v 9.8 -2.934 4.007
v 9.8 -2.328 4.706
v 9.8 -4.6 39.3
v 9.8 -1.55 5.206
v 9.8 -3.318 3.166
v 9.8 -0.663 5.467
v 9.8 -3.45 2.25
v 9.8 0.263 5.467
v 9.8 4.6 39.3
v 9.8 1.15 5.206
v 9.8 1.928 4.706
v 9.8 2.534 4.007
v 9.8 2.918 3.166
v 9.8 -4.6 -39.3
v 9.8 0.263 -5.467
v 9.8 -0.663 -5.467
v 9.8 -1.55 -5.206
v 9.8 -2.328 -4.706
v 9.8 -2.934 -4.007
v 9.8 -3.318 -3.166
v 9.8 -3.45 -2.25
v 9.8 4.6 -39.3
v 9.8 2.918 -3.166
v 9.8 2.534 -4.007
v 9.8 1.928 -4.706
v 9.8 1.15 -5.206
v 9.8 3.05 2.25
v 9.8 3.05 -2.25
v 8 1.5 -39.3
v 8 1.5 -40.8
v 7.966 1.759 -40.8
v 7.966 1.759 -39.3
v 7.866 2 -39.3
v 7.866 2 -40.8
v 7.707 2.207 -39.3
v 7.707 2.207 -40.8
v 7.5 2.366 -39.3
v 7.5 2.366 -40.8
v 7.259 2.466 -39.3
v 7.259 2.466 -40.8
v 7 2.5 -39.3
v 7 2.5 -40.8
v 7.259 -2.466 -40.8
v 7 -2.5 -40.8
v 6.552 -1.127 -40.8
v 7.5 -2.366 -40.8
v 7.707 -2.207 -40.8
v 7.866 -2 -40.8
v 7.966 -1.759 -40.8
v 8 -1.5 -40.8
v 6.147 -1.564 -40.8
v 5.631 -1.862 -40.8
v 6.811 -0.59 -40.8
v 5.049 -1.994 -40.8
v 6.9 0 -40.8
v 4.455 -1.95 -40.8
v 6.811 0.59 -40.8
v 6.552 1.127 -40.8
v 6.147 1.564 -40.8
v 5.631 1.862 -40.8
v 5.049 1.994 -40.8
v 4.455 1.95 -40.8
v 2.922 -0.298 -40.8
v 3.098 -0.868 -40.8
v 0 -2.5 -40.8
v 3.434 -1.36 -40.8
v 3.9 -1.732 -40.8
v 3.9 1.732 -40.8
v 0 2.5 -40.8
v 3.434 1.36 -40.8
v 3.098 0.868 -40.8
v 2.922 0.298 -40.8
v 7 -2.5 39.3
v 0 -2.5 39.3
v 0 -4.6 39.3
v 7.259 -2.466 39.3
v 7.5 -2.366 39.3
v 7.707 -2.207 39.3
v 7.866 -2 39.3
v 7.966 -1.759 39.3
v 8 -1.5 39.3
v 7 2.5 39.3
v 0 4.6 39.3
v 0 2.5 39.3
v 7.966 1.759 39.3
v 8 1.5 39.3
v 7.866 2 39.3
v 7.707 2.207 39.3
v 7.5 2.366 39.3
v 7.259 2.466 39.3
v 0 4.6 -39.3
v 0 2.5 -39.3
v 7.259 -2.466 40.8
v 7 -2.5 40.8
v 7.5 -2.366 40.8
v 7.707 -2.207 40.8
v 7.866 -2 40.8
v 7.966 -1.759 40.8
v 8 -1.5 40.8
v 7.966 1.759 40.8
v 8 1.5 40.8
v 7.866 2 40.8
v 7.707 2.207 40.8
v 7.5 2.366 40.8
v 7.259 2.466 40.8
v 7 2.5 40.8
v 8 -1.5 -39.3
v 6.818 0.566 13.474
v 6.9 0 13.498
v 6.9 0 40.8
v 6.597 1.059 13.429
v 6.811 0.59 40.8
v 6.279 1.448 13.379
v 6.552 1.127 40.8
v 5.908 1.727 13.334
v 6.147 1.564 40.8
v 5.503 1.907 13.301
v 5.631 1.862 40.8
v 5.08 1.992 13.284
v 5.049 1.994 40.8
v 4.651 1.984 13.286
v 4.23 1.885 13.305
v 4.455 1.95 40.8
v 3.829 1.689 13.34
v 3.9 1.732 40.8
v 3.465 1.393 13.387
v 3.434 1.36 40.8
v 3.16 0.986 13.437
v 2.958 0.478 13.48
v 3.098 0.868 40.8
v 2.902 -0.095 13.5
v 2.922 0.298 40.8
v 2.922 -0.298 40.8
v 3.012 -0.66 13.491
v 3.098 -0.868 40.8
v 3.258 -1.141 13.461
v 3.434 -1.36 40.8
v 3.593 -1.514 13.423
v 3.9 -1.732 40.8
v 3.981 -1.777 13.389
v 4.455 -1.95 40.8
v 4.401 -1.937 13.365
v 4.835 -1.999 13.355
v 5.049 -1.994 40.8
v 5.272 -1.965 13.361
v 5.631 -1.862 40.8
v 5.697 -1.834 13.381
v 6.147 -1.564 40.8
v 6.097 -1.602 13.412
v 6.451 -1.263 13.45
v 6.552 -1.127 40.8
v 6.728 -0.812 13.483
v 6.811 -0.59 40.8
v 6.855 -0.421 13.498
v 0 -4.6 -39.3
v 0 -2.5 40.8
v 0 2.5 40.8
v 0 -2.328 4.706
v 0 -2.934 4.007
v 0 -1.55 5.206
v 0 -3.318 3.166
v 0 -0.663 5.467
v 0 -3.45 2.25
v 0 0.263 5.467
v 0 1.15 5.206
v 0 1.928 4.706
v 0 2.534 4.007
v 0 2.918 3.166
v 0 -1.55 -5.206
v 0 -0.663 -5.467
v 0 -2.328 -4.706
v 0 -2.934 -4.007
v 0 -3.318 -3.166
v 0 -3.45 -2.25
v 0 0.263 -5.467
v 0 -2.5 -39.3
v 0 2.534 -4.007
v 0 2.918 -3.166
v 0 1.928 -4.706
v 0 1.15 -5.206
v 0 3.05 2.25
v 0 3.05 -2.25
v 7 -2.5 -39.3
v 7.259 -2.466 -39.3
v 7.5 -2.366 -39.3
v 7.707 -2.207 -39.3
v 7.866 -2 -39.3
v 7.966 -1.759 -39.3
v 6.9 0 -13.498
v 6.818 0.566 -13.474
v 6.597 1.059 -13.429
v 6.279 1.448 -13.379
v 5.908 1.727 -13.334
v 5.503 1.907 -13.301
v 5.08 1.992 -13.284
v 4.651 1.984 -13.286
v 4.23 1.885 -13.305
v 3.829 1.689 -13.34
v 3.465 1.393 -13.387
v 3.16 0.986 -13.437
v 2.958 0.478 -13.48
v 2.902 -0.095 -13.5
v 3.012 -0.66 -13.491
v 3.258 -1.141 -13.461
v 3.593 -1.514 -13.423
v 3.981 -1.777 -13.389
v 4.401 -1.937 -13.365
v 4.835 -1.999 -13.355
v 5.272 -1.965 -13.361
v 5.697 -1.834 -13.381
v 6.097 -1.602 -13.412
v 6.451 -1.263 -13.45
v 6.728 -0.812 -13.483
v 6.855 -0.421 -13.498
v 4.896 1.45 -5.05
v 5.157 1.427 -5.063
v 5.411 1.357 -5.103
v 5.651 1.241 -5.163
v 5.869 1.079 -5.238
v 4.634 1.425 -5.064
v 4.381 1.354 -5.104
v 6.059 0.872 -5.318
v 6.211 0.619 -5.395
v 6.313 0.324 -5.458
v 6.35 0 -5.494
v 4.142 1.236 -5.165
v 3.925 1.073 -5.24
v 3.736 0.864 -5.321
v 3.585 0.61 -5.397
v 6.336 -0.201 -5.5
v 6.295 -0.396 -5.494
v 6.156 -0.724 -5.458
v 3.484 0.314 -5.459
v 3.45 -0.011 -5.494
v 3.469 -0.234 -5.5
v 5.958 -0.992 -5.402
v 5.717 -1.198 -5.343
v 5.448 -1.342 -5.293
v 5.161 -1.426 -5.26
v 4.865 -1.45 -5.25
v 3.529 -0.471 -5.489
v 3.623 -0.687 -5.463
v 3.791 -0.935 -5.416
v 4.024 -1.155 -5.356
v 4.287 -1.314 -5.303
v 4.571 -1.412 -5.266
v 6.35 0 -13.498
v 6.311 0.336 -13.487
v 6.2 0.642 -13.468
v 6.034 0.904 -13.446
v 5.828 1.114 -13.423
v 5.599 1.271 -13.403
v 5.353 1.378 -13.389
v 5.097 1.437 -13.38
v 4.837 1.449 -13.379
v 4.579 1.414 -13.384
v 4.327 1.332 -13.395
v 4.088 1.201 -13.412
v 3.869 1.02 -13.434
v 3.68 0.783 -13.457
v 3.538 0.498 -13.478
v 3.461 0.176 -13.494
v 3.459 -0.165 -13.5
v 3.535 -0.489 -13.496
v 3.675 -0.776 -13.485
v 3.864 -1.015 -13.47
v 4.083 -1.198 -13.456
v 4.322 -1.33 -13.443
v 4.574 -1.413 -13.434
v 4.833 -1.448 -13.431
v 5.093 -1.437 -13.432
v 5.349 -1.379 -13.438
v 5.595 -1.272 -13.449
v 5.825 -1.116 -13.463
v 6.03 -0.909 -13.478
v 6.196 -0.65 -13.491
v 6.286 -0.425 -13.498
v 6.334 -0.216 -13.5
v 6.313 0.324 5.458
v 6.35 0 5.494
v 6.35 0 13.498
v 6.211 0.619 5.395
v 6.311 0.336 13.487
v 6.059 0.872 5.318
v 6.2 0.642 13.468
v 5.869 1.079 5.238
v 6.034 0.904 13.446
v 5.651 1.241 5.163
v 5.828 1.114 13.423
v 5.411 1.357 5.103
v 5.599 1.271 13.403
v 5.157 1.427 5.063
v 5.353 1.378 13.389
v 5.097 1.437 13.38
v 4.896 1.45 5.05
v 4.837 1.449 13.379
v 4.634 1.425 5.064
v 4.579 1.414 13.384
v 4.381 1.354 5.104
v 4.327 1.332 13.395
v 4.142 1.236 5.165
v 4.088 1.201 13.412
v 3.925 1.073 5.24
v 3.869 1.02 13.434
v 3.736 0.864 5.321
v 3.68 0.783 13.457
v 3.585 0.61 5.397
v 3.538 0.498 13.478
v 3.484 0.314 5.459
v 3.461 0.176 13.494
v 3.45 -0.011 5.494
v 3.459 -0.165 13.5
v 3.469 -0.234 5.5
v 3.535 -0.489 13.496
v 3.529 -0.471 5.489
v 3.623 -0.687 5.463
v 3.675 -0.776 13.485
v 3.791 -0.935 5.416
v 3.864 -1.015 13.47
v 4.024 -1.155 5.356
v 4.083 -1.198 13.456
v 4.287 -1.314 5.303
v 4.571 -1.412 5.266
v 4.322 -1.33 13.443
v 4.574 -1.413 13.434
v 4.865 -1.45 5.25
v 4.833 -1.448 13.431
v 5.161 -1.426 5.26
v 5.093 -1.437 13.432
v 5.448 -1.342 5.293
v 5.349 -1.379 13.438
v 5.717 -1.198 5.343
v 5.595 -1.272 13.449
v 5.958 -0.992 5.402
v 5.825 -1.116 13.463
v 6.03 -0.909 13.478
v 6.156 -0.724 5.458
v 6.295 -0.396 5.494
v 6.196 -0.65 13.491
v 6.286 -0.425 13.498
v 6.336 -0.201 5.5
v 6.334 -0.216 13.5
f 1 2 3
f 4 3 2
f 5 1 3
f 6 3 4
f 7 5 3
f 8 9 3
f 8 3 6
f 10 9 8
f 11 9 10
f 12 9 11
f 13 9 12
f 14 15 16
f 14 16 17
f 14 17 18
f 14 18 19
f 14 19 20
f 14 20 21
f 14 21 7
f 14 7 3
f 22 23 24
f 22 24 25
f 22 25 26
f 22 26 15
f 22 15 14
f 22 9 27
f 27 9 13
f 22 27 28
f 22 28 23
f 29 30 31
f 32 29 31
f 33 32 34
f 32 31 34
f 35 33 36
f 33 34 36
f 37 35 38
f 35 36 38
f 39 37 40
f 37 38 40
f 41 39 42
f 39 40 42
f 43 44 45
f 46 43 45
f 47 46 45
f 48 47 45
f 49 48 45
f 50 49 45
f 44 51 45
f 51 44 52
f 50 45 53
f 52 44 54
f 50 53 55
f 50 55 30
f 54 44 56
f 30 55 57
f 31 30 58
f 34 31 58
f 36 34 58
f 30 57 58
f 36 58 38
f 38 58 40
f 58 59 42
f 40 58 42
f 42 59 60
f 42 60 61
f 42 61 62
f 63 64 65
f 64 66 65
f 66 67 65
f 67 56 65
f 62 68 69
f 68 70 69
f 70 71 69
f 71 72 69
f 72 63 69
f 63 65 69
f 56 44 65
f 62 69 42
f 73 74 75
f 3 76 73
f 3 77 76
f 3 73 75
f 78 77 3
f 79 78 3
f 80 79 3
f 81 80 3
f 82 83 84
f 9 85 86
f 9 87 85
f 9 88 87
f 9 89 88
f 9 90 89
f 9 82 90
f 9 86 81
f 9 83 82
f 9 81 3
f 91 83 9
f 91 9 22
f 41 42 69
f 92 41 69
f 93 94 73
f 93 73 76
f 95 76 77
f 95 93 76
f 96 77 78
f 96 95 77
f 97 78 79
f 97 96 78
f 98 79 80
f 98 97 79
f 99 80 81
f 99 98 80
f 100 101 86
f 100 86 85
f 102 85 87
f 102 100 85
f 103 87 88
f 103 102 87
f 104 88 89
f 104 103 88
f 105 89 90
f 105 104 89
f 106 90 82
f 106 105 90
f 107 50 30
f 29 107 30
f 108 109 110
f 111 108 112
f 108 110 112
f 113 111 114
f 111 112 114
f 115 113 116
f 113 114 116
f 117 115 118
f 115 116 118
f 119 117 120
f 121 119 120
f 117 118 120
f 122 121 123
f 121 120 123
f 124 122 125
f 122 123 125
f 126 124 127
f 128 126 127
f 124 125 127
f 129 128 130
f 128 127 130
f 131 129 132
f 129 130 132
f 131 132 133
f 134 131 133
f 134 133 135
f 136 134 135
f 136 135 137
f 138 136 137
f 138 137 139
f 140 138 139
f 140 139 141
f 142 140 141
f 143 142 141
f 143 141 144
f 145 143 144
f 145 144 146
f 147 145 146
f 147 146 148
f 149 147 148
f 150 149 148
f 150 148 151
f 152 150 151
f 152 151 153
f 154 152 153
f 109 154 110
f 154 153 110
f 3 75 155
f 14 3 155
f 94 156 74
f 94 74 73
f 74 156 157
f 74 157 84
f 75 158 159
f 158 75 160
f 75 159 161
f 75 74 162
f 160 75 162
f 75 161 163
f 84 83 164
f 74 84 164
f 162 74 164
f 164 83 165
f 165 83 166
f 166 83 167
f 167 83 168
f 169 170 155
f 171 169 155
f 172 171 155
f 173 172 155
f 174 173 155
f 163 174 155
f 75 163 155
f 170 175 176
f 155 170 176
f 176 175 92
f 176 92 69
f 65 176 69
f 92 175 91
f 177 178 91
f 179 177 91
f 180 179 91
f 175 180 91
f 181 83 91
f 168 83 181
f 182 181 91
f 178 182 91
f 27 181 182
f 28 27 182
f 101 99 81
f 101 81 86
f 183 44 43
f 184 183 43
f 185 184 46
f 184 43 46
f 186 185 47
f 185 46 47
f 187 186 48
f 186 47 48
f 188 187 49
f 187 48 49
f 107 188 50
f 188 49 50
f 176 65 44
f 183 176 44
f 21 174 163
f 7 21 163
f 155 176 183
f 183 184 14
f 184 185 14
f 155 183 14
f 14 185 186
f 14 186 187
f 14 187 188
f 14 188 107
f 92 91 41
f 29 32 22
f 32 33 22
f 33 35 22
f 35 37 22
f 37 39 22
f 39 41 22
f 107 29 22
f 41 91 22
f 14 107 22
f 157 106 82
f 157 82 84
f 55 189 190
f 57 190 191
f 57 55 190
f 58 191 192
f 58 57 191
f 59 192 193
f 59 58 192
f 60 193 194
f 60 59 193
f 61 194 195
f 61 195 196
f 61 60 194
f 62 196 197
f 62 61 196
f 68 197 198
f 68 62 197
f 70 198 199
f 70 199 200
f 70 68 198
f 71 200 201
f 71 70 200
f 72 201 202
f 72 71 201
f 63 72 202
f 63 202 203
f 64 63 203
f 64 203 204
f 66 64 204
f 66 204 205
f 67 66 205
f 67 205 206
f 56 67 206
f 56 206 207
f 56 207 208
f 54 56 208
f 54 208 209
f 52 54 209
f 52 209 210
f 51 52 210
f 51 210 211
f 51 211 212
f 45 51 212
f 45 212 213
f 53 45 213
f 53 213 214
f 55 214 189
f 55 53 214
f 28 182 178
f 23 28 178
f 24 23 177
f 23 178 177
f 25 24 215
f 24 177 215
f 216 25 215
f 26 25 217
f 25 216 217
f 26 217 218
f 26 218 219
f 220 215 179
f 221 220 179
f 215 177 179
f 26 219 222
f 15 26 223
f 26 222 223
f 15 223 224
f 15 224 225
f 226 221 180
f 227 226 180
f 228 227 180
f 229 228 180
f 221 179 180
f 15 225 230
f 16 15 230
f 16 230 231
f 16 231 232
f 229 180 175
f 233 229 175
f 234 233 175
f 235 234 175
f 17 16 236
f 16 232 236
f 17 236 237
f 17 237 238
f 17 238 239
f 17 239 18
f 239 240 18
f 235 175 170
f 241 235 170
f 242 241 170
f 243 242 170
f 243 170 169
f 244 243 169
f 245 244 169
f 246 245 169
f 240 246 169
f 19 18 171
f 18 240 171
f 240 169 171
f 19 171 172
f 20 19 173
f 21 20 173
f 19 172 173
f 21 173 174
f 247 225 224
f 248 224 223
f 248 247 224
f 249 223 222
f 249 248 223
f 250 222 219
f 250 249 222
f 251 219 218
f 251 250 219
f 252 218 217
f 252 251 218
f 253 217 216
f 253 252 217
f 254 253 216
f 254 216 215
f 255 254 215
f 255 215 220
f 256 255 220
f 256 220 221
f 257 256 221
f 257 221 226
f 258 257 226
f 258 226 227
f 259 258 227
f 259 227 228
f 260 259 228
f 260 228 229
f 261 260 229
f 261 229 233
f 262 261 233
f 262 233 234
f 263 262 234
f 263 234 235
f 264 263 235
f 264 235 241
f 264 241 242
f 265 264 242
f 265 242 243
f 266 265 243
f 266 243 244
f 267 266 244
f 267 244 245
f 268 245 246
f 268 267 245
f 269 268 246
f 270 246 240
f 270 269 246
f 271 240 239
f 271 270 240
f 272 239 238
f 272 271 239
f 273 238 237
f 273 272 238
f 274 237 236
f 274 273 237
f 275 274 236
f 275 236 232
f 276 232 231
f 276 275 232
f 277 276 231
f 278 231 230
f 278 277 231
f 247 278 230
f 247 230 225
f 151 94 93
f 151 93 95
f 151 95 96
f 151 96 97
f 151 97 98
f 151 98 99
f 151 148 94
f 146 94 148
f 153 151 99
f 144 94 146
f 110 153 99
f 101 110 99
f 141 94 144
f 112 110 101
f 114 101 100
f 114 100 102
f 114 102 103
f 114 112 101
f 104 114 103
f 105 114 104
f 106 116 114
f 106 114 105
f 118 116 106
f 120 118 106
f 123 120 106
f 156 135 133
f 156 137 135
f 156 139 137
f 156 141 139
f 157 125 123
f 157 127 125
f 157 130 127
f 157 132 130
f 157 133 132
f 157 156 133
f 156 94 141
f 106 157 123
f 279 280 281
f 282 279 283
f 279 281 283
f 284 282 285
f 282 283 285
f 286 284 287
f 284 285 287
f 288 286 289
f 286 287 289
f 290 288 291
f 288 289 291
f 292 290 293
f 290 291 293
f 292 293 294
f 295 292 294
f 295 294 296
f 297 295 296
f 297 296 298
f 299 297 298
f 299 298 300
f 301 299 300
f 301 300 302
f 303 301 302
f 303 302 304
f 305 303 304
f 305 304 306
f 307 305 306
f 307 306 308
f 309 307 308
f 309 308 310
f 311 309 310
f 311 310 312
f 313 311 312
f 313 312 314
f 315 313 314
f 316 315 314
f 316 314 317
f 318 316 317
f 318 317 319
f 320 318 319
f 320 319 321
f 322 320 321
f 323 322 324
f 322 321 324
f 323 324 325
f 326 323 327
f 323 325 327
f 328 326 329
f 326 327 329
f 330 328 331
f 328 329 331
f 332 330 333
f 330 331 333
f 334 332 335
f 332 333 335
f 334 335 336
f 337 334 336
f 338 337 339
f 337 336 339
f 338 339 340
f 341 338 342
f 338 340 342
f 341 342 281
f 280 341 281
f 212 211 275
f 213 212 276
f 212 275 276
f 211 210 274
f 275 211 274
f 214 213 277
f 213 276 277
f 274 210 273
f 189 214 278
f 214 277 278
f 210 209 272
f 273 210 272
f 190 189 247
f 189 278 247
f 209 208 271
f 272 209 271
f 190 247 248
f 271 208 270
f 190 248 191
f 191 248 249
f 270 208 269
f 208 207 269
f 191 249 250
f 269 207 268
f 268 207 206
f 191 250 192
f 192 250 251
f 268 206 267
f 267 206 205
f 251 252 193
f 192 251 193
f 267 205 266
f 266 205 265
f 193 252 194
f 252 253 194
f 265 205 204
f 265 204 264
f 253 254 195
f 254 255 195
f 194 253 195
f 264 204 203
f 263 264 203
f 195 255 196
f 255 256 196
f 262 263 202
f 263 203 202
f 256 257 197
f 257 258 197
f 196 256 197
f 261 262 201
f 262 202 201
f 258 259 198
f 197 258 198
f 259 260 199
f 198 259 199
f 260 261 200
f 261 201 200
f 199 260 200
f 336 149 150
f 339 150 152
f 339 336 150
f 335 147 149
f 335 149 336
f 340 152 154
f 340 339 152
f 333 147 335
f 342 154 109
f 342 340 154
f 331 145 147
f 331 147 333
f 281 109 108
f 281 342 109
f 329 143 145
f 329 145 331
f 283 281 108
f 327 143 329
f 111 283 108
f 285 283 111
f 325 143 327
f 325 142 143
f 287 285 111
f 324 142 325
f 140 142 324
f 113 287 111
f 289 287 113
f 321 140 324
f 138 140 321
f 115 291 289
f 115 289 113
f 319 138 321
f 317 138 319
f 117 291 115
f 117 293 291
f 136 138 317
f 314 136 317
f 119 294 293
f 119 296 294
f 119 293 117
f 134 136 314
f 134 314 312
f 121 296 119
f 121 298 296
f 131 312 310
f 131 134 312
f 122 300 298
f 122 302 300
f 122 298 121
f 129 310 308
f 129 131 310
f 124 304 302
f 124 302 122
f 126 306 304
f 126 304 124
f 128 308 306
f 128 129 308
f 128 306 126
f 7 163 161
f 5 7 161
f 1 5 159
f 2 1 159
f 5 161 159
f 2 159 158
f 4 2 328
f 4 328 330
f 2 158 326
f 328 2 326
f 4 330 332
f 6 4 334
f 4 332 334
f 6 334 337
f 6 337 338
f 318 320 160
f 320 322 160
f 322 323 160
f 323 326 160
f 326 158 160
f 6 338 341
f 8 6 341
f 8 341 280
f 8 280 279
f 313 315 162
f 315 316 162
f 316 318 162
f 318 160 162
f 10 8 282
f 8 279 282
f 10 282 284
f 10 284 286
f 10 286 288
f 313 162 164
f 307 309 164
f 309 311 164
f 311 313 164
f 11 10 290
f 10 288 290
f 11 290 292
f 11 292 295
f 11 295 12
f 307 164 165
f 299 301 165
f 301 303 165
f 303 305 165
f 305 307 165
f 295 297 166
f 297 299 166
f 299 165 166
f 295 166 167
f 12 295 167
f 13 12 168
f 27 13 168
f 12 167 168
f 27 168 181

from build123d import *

# Parameters (mm, degrees)
SKETCH1_W               = 81.6
SKETCH1_H               = 0.9
SKETCH1_H_2             = 7.4
BOSS_EXTRUDE1_DEPTH     = 9.8
SKETCH5_W               = 9.8
SKETCH5_H               = 9.2
CUT_EXTRUDE3_DEPTH      = 1.5
CUT_EXTRUDE1_REACH      = 84.315
CUT_EXTRUDE1_END_RADIUS = 3.25
SKETCH3_R               = 1.45
CUT_EXTRUDE2_REACH      = 84.315
CUT_EXTRUDE2_END_RADIUS = 11.25
SKETCH4_R               = 2


with BuildPart() as part:
    # Sketch1 → Boss-Extrude1 (new body)
    # profile 1 of 3: a face of its own
    with BuildSketch(Plane(origin=(0, 0, 0), x_dir=(0, 0, -1), z_dir=(1, 0, 0))):
        with Locations((0, 4.15)):
            Rectangle(SKETCH1_W, SKETCH1_H)
    # profile 2 of 3: a face of its own
    with BuildSketch(Plane(origin=(0, 0, 0), x_dir=(0, 0, -1), z_dir=(1, 0, 0))):
        Rectangle(SKETCH1_W, SKETCH1_H_2)
        with BuildLine():
            ThreePointArc((-2.25, -3.45), (-5.5, -0.2), (-2.25, 3.05))
            Line((-2.25, 3.05), (2.25, 3.05))
            ThreePointArc((2.25, 3.05), (5.5, -0.2), (2.25, -3.45))
            Line((2.25, -3.45), (-2.25, -3.45))
        make_face(mode=Mode.SUBTRACT)
    # profile 3 of 3: a face of its own
    with BuildSketch(Plane(origin=(0, 0, 0), x_dir=(0, 0, -1), z_dir=(1, 0, 0))):
        with Locations((0, -4.15)):
            Rectangle(SKETCH1_W, SKETCH1_H)
    extrude(amount=BOSS_EXTRUDE1_DEPTH)

    # Sketch5 → Cut-Extrude3 (cut)
    with BuildSketch(Plane.XY.offset(40.8)):
        with Locations((4.9, 0)):
            Rectangle(SKETCH5_W, SKETCH5_H)
        with BuildLine():
            Line((7, 2.5), (0, 2.5))
            Line((0, 2.5), (0, -2.5))
            Line((0, -2.5), (7, -2.5))
            ThreePointArc((7, -2.5), (7.707106781, -2.207106781), (8, -1.5))
            Line((8, -1.5), (8, 1.5))
            ThreePointArc((8, 1.5), (7.707106781, 2.207106781), (7, 2.5))
        make_face(mode=Mode.SUBTRACT)
    cut_extrude3 = extrude(amount=-CUT_EXTRUDE3_DEPTH, mode=Mode.SUBTRACT)

    # Cut-Extrude1: up to this cylinder (the profile starts outside it)
    cut_extrude1_end = Plane(origin=(4.9, -0.2, 2.25), z_dir=(-1, 0, 0)) * Cylinder(CUT_EXTRUDE1_END_RADIUS, 176.13, mode=Mode.PRIVATE)
    # Sketch3 → Cut-Extrude1 (cut, up to the surface)
    with BuildSketch(Plane.XY.offset(40.8), mode=Mode.PRIVATE) as cut_extrude1_sk1:
        with Locations((4.9, 0)):
            Circle(SKETCH3_R)
    cut_extrude1_tool1 = extrude(cut_extrude1_sk1.sketch, amount=-CUT_EXTRUDE1_REACH, mode=Mode.PRIVATE) - cut_extrude1_end
    cut_extrude1 = cut_extrude1_tool1.solids().sort_by_distance((4.9, 0, 40.8))[0]
    add(cut_extrude1, mode=Mode.SUBTRACT)

    # Cut-Extrude2: up to this cylinder (the profile starts outside it)
    cut_extrude2_end = Plane(origin=(4.9, -0.2, 2.25), z_dir=(-1, 0, 0)) * Cylinder(CUT_EXTRUDE2_END_RADIUS, 192.13, mode=Mode.PRIVATE)
    # Sketch4 → Cut-Extrude2 (cut, up to the surface)
    with BuildSketch(Plane.XY.offset(40.8), mode=Mode.PRIVATE) as cut_extrude2_sk1:
        with Locations((4.9, 0)):
            Circle(SKETCH4_R)
    cut_extrude2_tool1 = extrude(cut_extrude2_sk1.sketch, amount=-CUT_EXTRUDE2_REACH, mode=Mode.PRIVATE) - cut_extrude2_end
    cut_extrude2 = cut_extrude2_tool1.solids().sort_by_distance((4.9, 0, 40.8))[0]
    add(cut_extrude2, mode=Mode.SUBTRACT)

    # Mirror5: Cut-Extrude3, Cut-Extrude1, Cut-Extrude2 across plane
    add(cut_extrude3.mirror(Plane.XY), mode=Mode.SUBTRACT)
    add(cut_extrude1.mirror(Plane.XY), mode=Mode.SUBTRACT)
    add(cut_extrude2.mirror(Plane.XY), mode=Mode.SUBTRACT)


solid = part.part
